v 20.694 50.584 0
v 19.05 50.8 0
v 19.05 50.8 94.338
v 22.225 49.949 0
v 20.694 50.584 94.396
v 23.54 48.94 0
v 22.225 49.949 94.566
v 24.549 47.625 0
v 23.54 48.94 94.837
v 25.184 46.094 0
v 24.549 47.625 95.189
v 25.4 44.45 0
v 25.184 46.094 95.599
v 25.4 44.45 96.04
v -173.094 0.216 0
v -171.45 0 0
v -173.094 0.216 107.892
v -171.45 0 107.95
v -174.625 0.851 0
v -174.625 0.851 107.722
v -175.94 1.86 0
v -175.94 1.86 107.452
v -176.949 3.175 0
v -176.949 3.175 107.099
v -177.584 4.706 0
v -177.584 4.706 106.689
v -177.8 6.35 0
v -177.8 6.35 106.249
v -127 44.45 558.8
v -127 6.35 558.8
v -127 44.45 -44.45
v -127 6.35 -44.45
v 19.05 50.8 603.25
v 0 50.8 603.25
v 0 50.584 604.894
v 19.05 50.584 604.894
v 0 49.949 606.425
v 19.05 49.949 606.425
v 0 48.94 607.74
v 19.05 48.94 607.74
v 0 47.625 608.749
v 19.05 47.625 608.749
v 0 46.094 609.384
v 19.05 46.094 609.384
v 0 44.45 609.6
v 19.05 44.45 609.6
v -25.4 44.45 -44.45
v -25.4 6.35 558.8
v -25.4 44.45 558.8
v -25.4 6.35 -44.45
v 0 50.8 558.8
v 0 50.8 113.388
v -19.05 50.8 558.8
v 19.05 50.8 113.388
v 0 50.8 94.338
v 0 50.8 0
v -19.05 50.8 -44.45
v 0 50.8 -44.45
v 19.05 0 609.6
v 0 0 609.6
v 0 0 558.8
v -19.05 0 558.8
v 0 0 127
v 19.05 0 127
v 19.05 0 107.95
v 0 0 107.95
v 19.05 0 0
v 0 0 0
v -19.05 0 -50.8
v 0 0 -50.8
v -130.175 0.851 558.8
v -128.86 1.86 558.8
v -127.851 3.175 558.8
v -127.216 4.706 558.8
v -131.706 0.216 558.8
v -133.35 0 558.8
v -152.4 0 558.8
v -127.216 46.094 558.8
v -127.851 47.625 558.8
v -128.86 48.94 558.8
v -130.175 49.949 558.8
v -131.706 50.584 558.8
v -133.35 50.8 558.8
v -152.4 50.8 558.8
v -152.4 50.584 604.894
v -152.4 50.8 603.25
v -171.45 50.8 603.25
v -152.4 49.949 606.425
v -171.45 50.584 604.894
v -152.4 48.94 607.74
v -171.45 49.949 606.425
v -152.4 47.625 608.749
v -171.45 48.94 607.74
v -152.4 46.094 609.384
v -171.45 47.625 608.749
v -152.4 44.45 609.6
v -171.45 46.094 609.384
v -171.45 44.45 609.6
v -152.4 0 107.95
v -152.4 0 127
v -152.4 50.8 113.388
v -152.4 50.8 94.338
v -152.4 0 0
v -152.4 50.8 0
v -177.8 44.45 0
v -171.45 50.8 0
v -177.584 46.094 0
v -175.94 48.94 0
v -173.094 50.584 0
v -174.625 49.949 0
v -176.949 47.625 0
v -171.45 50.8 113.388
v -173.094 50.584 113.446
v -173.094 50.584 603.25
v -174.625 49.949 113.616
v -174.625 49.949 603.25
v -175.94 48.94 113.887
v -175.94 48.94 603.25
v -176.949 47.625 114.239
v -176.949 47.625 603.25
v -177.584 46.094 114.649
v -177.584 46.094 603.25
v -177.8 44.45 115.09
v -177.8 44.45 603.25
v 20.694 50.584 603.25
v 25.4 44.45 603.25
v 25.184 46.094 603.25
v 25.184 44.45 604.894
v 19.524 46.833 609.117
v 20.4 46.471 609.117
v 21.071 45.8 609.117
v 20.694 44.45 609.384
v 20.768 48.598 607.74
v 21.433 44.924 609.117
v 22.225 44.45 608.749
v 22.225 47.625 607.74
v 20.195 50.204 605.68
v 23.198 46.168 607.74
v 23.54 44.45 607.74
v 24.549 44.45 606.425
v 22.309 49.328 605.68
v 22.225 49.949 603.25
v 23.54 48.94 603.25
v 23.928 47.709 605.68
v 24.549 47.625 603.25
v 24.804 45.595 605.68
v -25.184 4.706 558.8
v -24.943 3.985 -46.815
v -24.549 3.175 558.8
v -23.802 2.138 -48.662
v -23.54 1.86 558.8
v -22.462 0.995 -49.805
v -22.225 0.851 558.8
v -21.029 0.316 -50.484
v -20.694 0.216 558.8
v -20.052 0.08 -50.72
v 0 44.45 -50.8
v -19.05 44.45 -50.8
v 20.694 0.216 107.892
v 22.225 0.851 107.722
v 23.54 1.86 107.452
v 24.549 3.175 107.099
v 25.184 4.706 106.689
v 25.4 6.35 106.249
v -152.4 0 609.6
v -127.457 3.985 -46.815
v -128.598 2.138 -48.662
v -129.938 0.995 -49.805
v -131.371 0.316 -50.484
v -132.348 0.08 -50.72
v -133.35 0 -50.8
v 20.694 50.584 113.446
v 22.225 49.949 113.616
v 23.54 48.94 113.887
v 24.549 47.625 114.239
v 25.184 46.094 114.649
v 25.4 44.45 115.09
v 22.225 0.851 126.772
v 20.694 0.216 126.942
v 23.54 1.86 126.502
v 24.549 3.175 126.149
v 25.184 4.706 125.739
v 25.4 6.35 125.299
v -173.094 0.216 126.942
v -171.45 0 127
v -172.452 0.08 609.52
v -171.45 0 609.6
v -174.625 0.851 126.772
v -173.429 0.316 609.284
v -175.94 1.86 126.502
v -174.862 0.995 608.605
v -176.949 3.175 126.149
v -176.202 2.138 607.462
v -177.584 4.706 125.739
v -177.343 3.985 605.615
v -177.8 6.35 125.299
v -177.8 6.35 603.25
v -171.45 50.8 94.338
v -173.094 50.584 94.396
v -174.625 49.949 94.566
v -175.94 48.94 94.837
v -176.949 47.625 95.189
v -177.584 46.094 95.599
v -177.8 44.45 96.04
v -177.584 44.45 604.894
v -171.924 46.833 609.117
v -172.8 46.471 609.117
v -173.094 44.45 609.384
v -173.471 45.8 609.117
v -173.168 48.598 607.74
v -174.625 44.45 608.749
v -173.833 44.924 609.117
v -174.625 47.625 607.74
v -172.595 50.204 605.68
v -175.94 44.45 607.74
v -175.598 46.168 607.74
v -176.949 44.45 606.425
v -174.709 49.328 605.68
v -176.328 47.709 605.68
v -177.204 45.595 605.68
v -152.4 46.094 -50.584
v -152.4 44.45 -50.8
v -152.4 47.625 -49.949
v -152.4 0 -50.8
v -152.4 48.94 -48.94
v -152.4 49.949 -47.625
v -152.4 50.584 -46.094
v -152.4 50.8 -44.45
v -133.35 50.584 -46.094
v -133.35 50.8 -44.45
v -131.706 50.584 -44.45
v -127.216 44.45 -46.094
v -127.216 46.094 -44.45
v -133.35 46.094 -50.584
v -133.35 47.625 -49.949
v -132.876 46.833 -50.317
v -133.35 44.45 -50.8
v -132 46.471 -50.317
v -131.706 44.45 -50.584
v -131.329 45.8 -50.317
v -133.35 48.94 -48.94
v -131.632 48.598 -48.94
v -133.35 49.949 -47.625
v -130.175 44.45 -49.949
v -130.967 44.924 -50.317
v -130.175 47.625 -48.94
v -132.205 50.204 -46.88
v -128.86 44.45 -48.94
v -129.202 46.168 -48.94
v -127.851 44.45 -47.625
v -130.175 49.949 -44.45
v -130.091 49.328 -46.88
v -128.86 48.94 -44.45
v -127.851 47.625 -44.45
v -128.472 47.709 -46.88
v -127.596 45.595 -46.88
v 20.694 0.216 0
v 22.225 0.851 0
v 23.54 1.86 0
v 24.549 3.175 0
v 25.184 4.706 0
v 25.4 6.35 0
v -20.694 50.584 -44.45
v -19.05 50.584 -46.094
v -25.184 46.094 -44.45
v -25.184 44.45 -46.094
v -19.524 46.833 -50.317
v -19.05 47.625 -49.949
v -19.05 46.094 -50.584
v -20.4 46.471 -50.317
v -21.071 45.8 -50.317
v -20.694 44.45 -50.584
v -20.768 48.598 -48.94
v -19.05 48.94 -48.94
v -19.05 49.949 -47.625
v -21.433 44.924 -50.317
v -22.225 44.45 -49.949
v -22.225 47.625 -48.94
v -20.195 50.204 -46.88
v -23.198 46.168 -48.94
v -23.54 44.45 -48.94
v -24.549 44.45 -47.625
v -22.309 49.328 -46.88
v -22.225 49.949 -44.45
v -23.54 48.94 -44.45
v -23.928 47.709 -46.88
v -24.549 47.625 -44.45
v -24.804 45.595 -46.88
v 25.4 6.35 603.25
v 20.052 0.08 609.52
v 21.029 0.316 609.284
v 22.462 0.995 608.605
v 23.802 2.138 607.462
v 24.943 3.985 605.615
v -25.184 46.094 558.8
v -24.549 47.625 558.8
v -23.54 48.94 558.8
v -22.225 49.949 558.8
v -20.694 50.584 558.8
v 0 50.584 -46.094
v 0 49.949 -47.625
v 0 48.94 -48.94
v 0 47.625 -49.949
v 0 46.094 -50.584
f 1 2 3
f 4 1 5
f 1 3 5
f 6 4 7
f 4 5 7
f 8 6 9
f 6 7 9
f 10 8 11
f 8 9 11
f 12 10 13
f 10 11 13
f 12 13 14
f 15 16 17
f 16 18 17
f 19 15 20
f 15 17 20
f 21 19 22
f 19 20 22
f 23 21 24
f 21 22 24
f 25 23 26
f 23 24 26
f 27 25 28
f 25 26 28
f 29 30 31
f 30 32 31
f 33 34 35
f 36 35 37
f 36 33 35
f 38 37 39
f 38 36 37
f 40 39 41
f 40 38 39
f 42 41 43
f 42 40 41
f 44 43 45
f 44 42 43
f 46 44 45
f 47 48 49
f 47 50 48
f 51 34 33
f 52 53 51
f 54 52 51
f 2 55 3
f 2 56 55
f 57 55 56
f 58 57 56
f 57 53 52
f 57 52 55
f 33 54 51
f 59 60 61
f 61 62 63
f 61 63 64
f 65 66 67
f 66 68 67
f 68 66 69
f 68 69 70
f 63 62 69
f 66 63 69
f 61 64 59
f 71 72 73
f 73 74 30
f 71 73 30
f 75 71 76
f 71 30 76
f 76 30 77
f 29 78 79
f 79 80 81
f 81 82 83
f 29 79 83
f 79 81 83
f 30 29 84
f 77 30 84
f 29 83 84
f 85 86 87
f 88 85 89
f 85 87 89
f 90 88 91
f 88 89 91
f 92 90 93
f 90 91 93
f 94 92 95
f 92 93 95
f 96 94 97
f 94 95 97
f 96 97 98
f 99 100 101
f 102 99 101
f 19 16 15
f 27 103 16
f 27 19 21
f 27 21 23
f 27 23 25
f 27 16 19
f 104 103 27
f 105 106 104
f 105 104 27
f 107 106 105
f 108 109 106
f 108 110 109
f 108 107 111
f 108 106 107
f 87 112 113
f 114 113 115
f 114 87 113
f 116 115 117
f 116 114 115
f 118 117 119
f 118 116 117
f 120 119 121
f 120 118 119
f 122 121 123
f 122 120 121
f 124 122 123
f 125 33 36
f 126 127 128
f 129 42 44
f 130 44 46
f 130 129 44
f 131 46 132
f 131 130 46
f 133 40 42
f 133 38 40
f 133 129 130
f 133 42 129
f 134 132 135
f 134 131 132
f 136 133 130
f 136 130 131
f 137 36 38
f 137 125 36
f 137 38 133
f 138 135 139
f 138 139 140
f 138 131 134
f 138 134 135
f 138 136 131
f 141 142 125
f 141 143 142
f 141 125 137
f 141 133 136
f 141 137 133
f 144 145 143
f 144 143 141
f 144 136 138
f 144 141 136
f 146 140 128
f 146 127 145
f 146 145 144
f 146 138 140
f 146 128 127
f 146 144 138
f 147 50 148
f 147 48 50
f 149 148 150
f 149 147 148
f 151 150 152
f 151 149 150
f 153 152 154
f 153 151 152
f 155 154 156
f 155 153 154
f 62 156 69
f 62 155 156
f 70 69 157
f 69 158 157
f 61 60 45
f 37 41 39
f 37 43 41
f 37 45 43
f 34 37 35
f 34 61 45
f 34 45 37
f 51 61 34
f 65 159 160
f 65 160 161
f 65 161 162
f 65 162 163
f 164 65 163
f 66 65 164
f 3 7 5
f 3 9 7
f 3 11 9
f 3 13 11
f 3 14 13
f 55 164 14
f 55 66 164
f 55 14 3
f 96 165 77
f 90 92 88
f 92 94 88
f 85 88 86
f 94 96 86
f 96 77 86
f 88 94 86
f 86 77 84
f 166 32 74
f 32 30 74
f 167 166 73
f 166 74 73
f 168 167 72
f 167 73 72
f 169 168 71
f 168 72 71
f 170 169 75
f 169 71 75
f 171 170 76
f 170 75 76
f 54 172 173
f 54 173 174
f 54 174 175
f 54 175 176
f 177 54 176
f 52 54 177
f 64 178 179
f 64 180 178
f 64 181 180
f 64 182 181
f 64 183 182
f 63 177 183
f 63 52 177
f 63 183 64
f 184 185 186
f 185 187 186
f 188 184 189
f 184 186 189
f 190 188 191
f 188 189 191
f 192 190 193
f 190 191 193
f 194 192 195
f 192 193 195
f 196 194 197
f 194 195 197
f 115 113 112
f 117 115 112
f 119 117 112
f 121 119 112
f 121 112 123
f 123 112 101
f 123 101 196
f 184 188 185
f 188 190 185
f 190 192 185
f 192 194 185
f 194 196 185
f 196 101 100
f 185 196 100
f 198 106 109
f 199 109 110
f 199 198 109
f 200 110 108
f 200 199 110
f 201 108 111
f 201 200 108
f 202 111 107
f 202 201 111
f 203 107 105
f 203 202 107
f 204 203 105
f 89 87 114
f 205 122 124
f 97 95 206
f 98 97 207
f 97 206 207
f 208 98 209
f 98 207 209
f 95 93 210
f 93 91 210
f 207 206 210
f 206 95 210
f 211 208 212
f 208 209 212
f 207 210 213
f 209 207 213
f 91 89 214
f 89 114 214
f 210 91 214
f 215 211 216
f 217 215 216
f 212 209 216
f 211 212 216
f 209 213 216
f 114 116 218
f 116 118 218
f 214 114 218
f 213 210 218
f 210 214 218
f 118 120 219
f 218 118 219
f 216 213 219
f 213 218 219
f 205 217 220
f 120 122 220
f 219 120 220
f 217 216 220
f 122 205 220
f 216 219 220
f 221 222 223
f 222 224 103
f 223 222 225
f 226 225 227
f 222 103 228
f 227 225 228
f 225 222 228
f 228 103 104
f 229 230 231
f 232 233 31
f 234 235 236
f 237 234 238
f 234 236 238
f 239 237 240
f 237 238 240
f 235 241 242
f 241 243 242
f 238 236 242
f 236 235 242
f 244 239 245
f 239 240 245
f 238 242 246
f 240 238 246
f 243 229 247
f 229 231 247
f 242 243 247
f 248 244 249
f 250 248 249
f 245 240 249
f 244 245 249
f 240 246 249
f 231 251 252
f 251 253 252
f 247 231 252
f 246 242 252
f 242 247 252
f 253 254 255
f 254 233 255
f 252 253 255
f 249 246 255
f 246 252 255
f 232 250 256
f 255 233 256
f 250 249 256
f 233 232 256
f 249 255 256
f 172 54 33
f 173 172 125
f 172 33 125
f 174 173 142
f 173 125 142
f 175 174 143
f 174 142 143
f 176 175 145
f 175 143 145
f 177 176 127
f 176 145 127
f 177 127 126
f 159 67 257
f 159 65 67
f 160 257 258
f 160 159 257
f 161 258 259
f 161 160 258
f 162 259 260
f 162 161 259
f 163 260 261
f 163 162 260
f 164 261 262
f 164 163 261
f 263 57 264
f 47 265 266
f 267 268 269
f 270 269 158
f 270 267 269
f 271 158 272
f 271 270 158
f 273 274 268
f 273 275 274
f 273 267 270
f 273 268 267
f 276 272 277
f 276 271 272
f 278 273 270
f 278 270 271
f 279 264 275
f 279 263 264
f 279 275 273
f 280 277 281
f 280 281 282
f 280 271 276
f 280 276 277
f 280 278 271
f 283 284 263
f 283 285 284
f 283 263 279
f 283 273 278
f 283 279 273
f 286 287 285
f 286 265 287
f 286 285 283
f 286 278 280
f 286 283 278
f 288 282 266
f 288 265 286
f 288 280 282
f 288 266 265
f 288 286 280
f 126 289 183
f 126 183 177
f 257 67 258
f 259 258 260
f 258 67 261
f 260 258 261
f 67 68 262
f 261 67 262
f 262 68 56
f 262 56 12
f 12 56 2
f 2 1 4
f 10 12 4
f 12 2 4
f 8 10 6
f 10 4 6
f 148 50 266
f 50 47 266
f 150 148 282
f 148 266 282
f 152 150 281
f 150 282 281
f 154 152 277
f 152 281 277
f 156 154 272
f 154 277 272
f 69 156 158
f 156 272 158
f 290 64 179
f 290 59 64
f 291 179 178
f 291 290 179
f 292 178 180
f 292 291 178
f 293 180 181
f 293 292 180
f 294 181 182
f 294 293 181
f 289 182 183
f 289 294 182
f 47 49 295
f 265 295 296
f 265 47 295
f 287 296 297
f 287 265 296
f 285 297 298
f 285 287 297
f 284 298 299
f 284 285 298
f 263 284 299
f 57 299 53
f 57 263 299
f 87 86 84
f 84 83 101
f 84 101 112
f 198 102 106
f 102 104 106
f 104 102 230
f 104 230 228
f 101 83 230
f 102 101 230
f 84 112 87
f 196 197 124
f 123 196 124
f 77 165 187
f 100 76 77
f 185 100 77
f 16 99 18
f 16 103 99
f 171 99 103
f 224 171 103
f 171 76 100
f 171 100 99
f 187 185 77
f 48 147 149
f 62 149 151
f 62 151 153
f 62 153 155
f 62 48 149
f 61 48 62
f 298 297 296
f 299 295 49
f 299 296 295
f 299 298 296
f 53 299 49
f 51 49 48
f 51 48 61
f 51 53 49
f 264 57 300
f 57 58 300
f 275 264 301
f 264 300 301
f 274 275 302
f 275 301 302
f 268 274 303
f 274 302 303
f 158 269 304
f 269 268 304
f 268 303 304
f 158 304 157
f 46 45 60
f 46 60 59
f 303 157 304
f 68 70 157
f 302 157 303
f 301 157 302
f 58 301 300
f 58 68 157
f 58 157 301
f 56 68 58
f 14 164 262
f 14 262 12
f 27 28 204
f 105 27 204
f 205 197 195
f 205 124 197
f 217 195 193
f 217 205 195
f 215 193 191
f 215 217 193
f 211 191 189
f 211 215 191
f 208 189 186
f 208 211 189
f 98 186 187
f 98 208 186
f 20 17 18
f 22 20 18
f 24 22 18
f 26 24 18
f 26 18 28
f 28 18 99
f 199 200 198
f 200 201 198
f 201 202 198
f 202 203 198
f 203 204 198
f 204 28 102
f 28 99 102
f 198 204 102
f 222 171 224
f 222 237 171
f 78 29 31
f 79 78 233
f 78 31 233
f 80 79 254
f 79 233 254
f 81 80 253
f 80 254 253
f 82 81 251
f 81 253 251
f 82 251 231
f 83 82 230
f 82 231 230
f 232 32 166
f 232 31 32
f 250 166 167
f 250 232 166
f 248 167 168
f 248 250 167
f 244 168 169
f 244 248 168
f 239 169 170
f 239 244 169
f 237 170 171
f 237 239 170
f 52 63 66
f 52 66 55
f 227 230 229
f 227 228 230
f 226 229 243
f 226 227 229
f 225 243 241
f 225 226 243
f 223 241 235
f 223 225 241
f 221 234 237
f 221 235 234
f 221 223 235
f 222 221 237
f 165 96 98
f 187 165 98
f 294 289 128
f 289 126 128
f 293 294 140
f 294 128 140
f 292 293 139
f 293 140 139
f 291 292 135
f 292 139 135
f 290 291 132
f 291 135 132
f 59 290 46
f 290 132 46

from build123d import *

# Parameters (mm, degrees)
F0_W          = 25.4
F0_H          = 50.8
F1_DEPTH      = 609.6
F2_DEPTH      = 50.8
F2_DEPTH_BACK = 558.8
F4_DEPTH      = 25.4
F5_R          = 6.35


with BuildPart() as f1:
    # F0 (on Top) → F1 (new body)
    with BuildSketch(Plane.XY):
        with Locations((12.7, 25.4)):
            Rectangle(F0_W, F0_H)
    extrude(amount=F1_DEPTH)

    # F0 (on Top) → F2 (join, two sides)
    with BuildSketch(Plane.XY) as f2_sk:
        with Locations((-12.7, 25.4)):
            Rectangle(F0_W, F0_H)
    extrude(amount=-F2_DEPTH)
    extrude(f2_sk.sketch, amount=F2_DEPTH_BACK)

    # F3 (on Right) → F4 (cut)
    with BuildSketch(Plane.YZ):
        Polygon((0, 127), (0, 107.95), (50.8, 94.3381810245), (50.8, 113.3881810245), align=None)
    extrude(amount=F4_DEPTH, mode=Mode.SUBTRACT)

    # F5
    f5_edges = [f1.edges().sort_by_distance(p)[0] for p in [
        (25.4, 50.8, 47.169091),
        (25.4, 50.8, 361.494091),
        (-25.4, 50.8, 254),
        (-12.7, 50.8, -50.8),
        (-25.4, 25.4, -50.8),
        (-25.4, 0, 254),
        (12.7, 50.8, 609.6),
        (25.4, 25.4, 609.6),
        (25.4, 0, 368.3),
        (25.4, 0, 53.975),
    ]]
    fillet(f5_edges, radius=F5_R)


with BuildPart() as f7_1:
    # F7: instance of F1
    add(f1.part.mirror(Plane.YZ.offset(-76.2)))


solid = Compound([f1.part, f7_1.part])
